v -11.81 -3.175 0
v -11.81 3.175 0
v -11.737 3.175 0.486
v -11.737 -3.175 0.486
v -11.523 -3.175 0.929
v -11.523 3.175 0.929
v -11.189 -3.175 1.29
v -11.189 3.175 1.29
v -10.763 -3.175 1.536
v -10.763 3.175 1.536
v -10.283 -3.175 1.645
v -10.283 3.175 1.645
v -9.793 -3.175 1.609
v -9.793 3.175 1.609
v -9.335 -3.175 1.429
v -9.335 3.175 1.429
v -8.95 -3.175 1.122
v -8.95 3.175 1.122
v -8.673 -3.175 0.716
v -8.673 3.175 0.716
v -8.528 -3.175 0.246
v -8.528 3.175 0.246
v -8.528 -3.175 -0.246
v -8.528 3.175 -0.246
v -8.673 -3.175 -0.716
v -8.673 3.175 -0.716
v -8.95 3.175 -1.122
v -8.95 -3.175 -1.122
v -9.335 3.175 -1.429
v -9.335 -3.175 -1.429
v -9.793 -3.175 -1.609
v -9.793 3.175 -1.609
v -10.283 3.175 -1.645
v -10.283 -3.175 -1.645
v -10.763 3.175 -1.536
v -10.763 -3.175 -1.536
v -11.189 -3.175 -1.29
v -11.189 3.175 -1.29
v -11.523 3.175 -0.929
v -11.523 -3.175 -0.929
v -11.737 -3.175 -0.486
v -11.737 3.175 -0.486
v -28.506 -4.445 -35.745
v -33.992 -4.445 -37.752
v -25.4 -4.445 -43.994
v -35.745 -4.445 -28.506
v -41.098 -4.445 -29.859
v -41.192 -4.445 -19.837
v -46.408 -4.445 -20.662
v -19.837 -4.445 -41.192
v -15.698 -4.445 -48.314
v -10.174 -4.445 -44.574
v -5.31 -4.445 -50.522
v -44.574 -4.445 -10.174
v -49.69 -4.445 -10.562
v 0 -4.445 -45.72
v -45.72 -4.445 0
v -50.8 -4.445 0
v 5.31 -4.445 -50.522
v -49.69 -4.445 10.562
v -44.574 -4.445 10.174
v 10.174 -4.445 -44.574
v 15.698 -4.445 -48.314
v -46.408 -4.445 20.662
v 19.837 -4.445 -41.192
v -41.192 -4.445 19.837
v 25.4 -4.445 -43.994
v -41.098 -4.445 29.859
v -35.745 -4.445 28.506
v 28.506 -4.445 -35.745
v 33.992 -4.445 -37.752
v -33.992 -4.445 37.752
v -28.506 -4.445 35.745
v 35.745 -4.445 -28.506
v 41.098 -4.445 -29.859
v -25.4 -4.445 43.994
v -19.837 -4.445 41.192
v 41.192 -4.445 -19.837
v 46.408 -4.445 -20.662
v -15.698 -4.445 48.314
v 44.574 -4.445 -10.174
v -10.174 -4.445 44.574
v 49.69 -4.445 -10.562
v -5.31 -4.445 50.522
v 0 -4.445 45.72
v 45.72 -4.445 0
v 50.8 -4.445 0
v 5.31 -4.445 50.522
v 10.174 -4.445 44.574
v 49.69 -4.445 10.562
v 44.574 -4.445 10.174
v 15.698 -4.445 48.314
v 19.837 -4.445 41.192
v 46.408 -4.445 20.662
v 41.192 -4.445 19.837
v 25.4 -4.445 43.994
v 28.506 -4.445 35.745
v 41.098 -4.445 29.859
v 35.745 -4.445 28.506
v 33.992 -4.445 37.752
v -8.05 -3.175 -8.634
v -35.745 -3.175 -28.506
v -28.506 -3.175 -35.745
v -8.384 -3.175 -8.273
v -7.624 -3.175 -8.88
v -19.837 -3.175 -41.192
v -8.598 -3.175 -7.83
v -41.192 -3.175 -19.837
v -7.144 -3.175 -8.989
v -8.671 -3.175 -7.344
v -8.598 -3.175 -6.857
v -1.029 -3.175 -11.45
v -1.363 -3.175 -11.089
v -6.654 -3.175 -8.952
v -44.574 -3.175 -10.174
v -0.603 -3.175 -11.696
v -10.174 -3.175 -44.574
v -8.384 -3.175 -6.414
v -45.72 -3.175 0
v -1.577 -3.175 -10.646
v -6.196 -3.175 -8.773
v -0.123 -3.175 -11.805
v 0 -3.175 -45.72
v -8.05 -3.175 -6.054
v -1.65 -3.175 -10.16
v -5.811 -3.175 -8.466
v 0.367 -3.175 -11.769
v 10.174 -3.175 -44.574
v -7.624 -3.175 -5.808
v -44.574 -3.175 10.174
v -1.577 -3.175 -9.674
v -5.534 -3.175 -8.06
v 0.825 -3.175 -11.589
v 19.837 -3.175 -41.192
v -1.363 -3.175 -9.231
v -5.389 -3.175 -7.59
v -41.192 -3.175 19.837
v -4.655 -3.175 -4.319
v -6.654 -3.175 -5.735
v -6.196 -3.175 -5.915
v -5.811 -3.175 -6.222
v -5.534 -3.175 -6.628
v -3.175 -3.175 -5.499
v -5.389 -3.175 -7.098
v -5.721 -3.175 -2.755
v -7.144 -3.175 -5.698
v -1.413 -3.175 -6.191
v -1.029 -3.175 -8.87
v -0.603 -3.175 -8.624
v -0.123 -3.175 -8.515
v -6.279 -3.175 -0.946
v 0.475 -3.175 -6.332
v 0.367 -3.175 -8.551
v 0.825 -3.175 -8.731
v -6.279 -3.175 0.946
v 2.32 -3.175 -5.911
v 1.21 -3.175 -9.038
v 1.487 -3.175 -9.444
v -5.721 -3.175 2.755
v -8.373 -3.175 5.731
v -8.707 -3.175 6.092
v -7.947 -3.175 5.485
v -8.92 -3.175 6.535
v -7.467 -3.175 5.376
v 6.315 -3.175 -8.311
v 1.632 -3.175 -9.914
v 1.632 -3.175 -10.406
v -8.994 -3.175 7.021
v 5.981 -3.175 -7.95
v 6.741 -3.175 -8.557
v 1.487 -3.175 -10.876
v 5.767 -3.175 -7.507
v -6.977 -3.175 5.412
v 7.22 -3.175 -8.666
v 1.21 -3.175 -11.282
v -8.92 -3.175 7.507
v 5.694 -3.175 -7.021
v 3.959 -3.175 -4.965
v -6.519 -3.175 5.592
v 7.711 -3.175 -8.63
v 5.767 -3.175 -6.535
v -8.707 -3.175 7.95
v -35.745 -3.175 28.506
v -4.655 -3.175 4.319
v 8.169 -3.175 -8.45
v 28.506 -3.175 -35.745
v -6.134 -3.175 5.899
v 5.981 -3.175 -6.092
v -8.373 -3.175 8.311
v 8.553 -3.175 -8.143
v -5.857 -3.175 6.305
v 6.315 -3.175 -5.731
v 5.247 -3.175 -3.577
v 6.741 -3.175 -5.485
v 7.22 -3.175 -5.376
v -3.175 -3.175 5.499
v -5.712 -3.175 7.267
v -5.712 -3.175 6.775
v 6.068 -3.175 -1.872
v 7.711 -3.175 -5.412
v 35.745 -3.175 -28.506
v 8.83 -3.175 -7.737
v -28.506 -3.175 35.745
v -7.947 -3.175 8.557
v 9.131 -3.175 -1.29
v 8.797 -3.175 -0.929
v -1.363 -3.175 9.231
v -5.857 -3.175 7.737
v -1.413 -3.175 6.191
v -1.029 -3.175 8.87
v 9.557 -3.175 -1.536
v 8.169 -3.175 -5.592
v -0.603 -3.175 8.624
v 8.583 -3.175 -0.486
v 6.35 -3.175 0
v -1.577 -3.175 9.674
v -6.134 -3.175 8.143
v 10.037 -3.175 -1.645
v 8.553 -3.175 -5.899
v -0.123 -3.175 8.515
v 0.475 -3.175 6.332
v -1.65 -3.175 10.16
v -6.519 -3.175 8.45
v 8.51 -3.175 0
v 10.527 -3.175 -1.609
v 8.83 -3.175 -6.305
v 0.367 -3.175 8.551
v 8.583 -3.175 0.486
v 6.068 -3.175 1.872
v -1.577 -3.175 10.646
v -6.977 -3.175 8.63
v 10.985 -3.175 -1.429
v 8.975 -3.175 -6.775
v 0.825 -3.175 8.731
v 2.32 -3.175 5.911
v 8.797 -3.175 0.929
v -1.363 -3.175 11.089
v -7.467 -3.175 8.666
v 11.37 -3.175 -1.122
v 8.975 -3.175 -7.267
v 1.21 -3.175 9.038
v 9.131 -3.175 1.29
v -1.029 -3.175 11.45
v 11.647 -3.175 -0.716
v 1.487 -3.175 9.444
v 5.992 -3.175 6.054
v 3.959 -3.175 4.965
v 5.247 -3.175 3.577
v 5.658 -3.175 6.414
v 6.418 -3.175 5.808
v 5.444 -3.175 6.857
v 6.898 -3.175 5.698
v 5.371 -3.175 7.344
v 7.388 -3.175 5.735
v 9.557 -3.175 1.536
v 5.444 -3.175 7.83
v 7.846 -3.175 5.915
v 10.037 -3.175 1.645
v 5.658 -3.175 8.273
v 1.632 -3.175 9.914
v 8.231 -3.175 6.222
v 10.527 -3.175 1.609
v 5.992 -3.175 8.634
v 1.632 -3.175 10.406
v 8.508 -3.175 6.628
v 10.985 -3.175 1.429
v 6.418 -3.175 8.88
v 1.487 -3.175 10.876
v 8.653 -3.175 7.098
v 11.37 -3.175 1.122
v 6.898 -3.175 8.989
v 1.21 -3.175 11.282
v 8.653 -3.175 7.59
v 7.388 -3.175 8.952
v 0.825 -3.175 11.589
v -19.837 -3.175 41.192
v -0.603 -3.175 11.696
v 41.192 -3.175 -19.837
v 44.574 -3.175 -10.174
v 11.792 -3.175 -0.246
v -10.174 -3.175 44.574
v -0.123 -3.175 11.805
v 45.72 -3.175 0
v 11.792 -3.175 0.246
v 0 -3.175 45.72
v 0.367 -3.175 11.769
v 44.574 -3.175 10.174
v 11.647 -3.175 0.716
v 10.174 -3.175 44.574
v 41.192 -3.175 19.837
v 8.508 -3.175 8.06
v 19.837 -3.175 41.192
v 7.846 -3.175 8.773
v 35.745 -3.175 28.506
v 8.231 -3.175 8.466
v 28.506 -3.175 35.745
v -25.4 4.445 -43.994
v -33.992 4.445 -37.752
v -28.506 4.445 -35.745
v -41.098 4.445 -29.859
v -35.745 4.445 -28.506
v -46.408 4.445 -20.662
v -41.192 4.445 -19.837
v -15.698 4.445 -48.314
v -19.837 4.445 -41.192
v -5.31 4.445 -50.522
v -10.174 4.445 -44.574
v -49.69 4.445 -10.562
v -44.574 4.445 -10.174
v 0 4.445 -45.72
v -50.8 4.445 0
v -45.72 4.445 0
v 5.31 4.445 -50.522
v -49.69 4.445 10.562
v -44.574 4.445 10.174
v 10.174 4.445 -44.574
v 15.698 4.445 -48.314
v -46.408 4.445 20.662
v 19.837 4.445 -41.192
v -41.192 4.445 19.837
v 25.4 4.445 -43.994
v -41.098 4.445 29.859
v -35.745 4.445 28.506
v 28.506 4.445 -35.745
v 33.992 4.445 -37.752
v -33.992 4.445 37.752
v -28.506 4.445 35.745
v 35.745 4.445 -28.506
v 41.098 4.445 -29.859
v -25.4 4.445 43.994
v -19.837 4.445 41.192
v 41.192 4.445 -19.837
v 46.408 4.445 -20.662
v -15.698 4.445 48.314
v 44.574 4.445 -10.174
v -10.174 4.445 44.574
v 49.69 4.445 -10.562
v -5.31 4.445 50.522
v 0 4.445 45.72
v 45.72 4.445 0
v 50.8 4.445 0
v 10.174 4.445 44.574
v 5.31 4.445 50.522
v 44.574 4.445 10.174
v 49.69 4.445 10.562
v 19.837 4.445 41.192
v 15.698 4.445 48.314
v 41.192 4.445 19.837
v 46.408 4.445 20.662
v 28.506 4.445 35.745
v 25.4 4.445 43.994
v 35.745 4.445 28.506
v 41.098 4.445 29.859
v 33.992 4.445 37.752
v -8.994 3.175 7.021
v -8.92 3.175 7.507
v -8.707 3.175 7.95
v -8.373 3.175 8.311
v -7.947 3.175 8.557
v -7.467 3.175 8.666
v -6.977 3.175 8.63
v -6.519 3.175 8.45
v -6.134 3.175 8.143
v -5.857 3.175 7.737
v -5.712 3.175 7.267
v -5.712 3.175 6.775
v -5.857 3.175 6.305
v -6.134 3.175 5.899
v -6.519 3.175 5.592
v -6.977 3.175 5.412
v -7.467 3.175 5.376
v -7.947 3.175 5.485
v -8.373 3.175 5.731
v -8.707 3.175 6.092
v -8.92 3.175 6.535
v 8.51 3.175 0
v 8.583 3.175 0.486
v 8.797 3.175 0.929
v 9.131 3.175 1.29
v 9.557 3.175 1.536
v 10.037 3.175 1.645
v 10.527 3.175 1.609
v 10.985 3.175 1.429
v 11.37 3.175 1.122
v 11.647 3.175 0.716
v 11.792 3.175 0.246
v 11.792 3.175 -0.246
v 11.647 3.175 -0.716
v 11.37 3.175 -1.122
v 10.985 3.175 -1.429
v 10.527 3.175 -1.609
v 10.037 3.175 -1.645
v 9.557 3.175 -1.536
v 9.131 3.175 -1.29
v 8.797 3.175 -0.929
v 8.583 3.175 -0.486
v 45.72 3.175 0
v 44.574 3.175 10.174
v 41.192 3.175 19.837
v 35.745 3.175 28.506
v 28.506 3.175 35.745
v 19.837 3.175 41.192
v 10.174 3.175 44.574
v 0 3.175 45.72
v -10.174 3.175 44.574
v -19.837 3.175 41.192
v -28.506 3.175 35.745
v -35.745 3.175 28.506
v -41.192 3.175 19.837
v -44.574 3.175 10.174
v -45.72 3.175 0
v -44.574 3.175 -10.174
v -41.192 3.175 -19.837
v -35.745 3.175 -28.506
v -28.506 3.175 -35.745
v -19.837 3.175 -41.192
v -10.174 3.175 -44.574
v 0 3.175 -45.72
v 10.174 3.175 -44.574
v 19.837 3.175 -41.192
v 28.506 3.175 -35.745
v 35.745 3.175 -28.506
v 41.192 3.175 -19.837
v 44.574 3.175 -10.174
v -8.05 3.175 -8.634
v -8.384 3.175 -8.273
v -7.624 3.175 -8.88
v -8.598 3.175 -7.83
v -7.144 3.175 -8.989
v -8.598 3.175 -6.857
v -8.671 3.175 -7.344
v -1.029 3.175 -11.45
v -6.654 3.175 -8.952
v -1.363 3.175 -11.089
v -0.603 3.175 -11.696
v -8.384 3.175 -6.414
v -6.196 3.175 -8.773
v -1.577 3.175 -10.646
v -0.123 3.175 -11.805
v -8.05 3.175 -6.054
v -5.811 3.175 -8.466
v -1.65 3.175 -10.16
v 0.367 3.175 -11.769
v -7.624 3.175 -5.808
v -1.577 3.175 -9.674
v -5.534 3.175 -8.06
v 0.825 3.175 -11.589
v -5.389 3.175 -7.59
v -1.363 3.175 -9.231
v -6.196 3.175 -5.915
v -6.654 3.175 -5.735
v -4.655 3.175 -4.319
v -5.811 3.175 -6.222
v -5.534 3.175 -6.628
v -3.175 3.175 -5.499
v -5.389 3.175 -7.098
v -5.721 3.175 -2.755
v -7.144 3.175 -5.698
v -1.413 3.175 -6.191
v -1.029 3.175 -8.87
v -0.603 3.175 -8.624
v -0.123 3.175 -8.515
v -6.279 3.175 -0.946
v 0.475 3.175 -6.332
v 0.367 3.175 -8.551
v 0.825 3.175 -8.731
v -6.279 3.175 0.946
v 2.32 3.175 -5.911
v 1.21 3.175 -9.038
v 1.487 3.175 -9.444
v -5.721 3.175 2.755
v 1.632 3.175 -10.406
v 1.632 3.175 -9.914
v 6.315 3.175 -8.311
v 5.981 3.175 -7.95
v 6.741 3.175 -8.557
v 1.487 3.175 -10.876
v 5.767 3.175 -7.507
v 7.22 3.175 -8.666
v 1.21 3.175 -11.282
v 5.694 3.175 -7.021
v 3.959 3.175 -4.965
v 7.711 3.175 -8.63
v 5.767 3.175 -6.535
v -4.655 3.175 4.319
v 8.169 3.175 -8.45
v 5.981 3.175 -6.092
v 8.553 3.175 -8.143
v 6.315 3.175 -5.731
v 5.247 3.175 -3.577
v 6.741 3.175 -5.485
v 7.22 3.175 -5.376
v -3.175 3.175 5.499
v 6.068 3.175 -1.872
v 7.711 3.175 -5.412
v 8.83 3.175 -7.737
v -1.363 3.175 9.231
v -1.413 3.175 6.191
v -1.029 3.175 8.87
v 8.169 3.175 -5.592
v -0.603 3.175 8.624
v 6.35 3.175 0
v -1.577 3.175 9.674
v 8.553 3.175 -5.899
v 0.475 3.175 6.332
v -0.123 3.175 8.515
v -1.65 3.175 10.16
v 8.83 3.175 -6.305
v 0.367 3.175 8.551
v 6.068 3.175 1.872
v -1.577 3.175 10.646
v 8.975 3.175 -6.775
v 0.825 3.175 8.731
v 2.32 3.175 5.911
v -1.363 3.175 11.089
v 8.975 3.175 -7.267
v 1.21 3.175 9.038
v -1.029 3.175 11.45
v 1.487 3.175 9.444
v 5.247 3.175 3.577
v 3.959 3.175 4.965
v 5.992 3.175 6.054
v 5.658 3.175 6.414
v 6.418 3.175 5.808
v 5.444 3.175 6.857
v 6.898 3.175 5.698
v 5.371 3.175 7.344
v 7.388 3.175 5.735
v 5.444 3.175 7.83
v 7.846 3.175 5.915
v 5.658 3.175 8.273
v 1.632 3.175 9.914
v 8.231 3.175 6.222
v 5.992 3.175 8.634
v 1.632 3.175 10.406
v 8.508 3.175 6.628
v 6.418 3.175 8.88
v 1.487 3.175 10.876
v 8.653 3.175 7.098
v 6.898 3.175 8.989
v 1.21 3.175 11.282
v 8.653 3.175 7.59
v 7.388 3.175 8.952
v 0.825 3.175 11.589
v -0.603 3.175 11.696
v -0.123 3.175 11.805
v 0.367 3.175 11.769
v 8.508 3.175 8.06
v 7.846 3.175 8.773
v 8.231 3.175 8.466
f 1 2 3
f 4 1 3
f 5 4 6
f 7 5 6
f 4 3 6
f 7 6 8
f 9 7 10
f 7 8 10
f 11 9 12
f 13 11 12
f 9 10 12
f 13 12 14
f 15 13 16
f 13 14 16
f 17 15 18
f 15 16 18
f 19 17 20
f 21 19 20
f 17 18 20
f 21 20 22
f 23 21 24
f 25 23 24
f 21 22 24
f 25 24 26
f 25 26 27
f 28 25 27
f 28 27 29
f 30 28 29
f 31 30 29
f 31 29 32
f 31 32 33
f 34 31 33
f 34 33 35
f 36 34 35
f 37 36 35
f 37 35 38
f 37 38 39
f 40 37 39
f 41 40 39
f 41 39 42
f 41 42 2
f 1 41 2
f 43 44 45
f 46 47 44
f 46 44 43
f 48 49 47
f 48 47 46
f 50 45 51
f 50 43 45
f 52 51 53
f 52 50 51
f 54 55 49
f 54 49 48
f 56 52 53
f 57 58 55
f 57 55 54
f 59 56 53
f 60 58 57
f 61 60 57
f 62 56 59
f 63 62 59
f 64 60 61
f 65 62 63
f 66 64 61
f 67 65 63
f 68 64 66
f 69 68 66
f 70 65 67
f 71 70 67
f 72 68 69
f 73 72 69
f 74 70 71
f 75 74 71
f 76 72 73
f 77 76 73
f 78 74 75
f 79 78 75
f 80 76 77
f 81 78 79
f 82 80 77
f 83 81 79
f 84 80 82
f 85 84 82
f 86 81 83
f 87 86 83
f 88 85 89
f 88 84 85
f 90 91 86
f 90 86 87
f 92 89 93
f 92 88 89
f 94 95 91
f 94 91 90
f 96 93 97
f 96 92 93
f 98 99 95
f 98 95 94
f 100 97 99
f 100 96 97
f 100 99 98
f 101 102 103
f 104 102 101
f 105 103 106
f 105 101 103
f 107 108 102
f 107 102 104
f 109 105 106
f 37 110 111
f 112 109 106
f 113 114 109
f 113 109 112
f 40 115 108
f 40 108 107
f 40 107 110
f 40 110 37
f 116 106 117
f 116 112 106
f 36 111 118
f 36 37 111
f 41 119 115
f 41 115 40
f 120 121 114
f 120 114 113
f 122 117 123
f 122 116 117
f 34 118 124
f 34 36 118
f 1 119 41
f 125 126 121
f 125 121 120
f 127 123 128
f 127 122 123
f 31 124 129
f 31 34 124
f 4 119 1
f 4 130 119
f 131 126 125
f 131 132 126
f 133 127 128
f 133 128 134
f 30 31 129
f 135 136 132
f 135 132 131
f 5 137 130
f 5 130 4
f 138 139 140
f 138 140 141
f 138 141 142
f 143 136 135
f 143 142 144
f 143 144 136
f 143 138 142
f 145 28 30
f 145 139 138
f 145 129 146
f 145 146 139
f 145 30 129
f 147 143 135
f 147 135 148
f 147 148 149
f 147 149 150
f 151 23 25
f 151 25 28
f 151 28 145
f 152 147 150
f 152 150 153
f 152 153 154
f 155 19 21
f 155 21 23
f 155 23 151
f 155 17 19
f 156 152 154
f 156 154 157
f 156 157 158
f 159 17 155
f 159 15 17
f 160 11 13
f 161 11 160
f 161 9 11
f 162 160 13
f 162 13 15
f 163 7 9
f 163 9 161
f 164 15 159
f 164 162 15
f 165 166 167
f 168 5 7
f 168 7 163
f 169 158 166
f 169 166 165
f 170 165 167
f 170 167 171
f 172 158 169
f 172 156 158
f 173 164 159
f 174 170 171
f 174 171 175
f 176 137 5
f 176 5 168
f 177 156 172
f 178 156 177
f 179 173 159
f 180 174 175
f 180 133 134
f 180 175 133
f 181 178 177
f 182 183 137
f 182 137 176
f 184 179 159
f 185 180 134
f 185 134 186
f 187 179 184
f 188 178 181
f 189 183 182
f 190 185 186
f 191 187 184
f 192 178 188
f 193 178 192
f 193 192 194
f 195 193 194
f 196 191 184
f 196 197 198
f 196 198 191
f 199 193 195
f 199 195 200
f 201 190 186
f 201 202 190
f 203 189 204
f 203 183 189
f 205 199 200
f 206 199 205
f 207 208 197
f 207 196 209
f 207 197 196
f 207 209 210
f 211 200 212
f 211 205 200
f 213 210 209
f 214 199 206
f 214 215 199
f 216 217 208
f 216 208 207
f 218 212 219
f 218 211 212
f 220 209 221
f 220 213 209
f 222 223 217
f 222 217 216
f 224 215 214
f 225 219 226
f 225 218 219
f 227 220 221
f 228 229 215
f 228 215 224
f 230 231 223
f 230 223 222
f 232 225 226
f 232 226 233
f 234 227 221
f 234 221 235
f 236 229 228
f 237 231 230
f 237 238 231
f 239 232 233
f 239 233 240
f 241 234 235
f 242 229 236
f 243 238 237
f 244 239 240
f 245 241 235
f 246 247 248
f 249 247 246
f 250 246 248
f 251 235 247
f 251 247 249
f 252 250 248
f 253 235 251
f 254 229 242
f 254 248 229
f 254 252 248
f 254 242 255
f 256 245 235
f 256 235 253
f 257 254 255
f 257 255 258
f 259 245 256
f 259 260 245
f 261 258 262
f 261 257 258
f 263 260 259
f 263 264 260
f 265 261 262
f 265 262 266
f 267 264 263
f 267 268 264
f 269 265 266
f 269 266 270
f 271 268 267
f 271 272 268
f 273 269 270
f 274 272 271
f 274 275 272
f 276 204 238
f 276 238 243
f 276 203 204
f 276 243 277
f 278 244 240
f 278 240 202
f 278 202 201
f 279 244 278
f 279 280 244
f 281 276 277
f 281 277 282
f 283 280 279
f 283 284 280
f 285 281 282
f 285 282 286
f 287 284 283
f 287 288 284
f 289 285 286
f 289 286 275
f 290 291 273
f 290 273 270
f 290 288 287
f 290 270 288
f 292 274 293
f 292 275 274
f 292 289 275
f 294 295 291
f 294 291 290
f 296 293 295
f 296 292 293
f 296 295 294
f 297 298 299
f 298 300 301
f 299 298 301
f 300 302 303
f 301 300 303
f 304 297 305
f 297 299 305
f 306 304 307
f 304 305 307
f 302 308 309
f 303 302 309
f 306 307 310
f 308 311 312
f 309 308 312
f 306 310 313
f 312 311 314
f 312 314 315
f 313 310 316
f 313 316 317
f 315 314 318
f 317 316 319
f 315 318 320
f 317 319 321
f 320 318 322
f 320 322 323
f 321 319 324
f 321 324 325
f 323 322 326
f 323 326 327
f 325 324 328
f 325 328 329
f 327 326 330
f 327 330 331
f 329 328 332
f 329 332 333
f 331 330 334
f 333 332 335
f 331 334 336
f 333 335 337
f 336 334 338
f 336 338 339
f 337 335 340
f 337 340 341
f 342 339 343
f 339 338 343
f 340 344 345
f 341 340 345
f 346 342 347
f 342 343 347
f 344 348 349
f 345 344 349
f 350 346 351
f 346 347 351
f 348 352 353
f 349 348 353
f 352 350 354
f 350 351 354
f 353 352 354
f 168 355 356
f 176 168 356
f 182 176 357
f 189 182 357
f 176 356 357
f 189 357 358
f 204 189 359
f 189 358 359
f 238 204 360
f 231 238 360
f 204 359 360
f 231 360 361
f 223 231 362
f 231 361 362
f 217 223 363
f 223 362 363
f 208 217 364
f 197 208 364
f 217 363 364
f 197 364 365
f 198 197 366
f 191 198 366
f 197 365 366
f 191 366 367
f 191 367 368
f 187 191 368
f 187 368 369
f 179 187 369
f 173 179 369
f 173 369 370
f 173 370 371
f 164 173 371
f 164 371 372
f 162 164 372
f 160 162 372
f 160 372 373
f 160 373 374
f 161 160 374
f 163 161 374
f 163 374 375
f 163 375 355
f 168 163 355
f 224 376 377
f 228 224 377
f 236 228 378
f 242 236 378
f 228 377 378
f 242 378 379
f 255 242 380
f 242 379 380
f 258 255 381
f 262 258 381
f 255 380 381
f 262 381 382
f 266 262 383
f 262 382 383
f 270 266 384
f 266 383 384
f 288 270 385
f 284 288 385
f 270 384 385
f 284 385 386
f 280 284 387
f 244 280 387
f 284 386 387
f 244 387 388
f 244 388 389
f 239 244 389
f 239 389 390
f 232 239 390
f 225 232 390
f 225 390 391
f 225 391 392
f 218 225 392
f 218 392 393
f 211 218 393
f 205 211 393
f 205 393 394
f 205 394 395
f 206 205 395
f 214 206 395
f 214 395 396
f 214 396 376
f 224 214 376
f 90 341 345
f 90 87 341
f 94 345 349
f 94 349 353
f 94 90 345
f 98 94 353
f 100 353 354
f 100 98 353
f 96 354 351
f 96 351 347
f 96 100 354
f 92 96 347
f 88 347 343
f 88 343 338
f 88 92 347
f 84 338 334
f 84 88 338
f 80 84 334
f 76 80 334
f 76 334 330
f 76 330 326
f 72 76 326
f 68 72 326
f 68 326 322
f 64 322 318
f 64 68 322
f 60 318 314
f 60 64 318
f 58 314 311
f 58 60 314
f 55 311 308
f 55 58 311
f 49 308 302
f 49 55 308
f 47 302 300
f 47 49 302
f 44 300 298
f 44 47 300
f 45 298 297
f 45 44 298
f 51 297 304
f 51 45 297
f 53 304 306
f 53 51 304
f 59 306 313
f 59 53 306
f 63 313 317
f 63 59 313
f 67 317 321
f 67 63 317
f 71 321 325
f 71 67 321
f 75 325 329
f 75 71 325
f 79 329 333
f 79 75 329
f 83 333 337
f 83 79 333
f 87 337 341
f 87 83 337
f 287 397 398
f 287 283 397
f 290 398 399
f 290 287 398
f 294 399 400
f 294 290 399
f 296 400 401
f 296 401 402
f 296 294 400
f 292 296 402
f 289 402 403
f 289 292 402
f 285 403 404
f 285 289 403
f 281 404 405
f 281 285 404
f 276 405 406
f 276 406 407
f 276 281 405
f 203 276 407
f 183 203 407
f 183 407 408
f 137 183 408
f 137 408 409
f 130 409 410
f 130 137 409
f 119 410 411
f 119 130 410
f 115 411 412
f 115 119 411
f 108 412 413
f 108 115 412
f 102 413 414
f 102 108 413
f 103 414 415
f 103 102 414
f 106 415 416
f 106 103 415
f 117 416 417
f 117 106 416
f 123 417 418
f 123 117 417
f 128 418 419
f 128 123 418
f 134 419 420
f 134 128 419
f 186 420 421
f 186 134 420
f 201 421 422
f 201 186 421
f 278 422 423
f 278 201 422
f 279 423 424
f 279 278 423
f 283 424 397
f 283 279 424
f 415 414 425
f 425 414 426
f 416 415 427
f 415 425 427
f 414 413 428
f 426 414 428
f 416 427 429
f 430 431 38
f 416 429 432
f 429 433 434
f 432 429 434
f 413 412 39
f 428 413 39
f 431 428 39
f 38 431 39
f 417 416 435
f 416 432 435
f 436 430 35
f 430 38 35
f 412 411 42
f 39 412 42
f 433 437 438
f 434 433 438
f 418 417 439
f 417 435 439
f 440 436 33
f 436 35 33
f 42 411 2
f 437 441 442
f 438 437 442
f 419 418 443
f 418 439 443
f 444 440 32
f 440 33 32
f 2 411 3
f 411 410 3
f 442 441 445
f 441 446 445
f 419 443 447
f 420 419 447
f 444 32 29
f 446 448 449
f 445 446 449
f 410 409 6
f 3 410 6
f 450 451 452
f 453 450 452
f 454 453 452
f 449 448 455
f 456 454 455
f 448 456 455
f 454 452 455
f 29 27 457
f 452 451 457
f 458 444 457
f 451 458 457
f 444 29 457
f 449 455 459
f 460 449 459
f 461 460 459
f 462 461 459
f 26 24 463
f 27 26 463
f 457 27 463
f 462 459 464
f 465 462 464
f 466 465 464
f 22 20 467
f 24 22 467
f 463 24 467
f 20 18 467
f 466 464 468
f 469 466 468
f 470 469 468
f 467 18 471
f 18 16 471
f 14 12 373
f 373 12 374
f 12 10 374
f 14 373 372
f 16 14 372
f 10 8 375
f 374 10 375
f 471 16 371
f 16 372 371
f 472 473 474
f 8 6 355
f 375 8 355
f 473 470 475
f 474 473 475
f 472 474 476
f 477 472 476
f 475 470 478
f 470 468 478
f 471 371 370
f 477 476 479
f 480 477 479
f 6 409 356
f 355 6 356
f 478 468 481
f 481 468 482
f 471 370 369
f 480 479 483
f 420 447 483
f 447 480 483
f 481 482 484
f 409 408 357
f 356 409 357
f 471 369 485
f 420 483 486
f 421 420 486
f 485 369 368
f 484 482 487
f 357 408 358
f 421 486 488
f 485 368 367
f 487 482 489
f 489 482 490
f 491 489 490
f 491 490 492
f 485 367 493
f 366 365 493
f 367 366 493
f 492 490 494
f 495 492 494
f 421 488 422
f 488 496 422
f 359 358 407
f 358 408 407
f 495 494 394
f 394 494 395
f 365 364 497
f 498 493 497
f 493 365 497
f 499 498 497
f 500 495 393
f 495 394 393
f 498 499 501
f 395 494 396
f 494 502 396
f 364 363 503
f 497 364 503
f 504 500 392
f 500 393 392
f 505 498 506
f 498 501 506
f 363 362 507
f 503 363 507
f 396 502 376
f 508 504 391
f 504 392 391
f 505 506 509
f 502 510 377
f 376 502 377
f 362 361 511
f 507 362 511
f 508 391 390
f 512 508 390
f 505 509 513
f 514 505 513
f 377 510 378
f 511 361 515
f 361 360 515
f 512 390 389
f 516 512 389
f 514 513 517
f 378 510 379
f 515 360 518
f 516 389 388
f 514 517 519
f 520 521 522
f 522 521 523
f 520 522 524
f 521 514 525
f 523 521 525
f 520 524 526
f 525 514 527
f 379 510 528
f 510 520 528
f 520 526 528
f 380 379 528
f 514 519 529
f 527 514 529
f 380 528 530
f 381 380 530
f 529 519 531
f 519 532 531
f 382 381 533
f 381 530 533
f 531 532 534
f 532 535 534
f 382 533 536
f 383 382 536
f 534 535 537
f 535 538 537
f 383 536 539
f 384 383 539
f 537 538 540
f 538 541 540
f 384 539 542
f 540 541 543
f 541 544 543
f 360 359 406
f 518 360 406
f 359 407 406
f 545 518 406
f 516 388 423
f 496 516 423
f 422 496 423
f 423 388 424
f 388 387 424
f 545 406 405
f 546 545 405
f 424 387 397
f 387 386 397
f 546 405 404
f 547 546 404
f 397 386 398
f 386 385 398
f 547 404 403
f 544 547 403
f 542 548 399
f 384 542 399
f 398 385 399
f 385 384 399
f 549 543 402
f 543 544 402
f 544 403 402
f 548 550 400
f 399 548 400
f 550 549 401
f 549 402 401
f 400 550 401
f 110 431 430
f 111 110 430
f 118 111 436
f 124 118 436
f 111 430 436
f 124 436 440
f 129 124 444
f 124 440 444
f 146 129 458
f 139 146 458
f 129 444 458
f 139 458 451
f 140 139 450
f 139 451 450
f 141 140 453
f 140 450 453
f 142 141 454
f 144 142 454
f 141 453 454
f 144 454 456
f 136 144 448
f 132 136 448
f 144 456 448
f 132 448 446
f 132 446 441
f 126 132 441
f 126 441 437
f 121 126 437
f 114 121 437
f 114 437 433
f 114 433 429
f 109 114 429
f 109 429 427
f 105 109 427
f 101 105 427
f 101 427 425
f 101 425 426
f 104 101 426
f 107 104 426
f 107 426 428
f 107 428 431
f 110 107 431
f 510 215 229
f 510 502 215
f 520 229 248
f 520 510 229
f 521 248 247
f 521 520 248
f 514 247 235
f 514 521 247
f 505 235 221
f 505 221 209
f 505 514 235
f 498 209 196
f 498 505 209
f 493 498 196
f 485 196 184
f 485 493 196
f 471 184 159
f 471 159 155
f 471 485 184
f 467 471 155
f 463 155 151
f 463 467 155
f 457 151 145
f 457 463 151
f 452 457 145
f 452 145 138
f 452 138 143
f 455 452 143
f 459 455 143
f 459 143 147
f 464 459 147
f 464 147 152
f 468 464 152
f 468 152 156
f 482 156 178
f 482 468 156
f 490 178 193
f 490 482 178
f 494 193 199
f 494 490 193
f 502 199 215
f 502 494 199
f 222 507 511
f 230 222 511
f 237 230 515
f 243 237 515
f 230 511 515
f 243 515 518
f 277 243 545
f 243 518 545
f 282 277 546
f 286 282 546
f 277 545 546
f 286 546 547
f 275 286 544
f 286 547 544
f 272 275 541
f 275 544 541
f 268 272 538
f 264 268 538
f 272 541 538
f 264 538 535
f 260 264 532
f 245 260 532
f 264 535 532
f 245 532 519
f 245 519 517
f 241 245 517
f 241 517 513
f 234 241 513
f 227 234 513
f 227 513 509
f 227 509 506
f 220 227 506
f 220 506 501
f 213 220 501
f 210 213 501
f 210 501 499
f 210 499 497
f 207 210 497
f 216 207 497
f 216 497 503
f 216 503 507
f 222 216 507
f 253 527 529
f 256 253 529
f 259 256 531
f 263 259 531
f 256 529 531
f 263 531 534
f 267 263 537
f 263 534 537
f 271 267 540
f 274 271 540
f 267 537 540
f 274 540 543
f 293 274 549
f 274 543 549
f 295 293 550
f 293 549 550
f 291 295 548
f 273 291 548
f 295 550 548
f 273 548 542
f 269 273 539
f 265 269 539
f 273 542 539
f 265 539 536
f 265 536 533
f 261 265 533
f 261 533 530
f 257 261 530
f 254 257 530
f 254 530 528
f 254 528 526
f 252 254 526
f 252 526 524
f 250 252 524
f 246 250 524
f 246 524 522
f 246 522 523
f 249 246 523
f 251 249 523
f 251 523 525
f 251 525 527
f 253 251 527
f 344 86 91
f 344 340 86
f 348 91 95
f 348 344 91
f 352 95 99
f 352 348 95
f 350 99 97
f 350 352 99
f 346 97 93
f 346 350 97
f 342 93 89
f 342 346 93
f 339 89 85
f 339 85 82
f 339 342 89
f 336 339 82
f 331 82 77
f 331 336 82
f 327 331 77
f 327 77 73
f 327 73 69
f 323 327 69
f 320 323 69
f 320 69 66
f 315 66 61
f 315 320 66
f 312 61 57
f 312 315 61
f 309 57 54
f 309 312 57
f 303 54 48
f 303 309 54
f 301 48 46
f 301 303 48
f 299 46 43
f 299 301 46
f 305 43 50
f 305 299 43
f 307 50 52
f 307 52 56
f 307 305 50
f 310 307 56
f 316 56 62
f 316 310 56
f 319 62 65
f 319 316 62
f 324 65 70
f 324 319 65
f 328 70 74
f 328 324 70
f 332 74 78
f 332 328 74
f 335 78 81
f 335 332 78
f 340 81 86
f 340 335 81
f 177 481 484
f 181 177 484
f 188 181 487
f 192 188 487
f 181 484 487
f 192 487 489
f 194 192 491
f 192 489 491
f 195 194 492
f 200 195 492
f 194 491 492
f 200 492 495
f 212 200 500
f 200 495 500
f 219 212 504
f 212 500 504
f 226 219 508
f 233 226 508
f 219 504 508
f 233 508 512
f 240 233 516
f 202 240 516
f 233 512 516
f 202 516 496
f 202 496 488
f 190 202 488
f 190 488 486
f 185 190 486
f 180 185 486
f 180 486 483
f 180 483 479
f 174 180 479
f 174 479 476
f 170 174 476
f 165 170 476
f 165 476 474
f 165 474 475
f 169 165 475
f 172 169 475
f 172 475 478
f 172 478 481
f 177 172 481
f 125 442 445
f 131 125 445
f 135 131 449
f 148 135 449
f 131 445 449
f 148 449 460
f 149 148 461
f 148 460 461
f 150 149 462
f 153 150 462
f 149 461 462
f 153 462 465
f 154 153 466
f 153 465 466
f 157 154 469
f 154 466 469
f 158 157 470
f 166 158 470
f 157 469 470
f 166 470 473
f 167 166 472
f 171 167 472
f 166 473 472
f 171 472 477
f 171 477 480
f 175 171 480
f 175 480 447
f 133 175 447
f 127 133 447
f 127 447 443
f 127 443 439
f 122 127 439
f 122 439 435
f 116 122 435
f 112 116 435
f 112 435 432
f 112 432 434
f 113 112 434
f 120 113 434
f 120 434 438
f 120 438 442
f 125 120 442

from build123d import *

# Parameters (mm, degrees)
F0_R     = 50.8
F0_R_2   = 45.72
F1_DEPTH = 4.445
F0_R_3   = 6.35
F2_DEPTH = 3.175
F4_D     = 3.3


# Not quite as in the source:
# - a feature names something its author has since deleted; it is built from what else it names


with BuildPart() as f1:
    # F0 (on Front) → F1 (new body, symmetric)
    with BuildSketch(Plane.XZ):
        Circle(F0_R)
        Circle(F0_R_2, mode=Mode.SUBTRACT)
    extrude(amount=F1_DEPTH, both=True)


with BuildPart() as f2:
    # F0 (on Front) → F2 (new body, symmetric)
    with BuildSketch(Plane.XZ):
        Circle(F0_R_2)
        Circle(F0_R_3, mode=Mode.SUBTRACT)
    extrude(amount=F2_DEPTH, both=True)

    # F4 (through all)
    with Locations(Plane.XZ.offset(3.175)):
        with Locations((10.16, 0), (7.3437980366, -7.0209850019), (0, -10.16), (-7.0209850019, -7.3437980366), (-10.16, 0), (-7.3437980366, 7.0209850019), (0, 10.16), (7.0209850019, 7.3437980366)):
            Hole(F4_D / 2)


solid = Compound([f1.part, f2.part])
